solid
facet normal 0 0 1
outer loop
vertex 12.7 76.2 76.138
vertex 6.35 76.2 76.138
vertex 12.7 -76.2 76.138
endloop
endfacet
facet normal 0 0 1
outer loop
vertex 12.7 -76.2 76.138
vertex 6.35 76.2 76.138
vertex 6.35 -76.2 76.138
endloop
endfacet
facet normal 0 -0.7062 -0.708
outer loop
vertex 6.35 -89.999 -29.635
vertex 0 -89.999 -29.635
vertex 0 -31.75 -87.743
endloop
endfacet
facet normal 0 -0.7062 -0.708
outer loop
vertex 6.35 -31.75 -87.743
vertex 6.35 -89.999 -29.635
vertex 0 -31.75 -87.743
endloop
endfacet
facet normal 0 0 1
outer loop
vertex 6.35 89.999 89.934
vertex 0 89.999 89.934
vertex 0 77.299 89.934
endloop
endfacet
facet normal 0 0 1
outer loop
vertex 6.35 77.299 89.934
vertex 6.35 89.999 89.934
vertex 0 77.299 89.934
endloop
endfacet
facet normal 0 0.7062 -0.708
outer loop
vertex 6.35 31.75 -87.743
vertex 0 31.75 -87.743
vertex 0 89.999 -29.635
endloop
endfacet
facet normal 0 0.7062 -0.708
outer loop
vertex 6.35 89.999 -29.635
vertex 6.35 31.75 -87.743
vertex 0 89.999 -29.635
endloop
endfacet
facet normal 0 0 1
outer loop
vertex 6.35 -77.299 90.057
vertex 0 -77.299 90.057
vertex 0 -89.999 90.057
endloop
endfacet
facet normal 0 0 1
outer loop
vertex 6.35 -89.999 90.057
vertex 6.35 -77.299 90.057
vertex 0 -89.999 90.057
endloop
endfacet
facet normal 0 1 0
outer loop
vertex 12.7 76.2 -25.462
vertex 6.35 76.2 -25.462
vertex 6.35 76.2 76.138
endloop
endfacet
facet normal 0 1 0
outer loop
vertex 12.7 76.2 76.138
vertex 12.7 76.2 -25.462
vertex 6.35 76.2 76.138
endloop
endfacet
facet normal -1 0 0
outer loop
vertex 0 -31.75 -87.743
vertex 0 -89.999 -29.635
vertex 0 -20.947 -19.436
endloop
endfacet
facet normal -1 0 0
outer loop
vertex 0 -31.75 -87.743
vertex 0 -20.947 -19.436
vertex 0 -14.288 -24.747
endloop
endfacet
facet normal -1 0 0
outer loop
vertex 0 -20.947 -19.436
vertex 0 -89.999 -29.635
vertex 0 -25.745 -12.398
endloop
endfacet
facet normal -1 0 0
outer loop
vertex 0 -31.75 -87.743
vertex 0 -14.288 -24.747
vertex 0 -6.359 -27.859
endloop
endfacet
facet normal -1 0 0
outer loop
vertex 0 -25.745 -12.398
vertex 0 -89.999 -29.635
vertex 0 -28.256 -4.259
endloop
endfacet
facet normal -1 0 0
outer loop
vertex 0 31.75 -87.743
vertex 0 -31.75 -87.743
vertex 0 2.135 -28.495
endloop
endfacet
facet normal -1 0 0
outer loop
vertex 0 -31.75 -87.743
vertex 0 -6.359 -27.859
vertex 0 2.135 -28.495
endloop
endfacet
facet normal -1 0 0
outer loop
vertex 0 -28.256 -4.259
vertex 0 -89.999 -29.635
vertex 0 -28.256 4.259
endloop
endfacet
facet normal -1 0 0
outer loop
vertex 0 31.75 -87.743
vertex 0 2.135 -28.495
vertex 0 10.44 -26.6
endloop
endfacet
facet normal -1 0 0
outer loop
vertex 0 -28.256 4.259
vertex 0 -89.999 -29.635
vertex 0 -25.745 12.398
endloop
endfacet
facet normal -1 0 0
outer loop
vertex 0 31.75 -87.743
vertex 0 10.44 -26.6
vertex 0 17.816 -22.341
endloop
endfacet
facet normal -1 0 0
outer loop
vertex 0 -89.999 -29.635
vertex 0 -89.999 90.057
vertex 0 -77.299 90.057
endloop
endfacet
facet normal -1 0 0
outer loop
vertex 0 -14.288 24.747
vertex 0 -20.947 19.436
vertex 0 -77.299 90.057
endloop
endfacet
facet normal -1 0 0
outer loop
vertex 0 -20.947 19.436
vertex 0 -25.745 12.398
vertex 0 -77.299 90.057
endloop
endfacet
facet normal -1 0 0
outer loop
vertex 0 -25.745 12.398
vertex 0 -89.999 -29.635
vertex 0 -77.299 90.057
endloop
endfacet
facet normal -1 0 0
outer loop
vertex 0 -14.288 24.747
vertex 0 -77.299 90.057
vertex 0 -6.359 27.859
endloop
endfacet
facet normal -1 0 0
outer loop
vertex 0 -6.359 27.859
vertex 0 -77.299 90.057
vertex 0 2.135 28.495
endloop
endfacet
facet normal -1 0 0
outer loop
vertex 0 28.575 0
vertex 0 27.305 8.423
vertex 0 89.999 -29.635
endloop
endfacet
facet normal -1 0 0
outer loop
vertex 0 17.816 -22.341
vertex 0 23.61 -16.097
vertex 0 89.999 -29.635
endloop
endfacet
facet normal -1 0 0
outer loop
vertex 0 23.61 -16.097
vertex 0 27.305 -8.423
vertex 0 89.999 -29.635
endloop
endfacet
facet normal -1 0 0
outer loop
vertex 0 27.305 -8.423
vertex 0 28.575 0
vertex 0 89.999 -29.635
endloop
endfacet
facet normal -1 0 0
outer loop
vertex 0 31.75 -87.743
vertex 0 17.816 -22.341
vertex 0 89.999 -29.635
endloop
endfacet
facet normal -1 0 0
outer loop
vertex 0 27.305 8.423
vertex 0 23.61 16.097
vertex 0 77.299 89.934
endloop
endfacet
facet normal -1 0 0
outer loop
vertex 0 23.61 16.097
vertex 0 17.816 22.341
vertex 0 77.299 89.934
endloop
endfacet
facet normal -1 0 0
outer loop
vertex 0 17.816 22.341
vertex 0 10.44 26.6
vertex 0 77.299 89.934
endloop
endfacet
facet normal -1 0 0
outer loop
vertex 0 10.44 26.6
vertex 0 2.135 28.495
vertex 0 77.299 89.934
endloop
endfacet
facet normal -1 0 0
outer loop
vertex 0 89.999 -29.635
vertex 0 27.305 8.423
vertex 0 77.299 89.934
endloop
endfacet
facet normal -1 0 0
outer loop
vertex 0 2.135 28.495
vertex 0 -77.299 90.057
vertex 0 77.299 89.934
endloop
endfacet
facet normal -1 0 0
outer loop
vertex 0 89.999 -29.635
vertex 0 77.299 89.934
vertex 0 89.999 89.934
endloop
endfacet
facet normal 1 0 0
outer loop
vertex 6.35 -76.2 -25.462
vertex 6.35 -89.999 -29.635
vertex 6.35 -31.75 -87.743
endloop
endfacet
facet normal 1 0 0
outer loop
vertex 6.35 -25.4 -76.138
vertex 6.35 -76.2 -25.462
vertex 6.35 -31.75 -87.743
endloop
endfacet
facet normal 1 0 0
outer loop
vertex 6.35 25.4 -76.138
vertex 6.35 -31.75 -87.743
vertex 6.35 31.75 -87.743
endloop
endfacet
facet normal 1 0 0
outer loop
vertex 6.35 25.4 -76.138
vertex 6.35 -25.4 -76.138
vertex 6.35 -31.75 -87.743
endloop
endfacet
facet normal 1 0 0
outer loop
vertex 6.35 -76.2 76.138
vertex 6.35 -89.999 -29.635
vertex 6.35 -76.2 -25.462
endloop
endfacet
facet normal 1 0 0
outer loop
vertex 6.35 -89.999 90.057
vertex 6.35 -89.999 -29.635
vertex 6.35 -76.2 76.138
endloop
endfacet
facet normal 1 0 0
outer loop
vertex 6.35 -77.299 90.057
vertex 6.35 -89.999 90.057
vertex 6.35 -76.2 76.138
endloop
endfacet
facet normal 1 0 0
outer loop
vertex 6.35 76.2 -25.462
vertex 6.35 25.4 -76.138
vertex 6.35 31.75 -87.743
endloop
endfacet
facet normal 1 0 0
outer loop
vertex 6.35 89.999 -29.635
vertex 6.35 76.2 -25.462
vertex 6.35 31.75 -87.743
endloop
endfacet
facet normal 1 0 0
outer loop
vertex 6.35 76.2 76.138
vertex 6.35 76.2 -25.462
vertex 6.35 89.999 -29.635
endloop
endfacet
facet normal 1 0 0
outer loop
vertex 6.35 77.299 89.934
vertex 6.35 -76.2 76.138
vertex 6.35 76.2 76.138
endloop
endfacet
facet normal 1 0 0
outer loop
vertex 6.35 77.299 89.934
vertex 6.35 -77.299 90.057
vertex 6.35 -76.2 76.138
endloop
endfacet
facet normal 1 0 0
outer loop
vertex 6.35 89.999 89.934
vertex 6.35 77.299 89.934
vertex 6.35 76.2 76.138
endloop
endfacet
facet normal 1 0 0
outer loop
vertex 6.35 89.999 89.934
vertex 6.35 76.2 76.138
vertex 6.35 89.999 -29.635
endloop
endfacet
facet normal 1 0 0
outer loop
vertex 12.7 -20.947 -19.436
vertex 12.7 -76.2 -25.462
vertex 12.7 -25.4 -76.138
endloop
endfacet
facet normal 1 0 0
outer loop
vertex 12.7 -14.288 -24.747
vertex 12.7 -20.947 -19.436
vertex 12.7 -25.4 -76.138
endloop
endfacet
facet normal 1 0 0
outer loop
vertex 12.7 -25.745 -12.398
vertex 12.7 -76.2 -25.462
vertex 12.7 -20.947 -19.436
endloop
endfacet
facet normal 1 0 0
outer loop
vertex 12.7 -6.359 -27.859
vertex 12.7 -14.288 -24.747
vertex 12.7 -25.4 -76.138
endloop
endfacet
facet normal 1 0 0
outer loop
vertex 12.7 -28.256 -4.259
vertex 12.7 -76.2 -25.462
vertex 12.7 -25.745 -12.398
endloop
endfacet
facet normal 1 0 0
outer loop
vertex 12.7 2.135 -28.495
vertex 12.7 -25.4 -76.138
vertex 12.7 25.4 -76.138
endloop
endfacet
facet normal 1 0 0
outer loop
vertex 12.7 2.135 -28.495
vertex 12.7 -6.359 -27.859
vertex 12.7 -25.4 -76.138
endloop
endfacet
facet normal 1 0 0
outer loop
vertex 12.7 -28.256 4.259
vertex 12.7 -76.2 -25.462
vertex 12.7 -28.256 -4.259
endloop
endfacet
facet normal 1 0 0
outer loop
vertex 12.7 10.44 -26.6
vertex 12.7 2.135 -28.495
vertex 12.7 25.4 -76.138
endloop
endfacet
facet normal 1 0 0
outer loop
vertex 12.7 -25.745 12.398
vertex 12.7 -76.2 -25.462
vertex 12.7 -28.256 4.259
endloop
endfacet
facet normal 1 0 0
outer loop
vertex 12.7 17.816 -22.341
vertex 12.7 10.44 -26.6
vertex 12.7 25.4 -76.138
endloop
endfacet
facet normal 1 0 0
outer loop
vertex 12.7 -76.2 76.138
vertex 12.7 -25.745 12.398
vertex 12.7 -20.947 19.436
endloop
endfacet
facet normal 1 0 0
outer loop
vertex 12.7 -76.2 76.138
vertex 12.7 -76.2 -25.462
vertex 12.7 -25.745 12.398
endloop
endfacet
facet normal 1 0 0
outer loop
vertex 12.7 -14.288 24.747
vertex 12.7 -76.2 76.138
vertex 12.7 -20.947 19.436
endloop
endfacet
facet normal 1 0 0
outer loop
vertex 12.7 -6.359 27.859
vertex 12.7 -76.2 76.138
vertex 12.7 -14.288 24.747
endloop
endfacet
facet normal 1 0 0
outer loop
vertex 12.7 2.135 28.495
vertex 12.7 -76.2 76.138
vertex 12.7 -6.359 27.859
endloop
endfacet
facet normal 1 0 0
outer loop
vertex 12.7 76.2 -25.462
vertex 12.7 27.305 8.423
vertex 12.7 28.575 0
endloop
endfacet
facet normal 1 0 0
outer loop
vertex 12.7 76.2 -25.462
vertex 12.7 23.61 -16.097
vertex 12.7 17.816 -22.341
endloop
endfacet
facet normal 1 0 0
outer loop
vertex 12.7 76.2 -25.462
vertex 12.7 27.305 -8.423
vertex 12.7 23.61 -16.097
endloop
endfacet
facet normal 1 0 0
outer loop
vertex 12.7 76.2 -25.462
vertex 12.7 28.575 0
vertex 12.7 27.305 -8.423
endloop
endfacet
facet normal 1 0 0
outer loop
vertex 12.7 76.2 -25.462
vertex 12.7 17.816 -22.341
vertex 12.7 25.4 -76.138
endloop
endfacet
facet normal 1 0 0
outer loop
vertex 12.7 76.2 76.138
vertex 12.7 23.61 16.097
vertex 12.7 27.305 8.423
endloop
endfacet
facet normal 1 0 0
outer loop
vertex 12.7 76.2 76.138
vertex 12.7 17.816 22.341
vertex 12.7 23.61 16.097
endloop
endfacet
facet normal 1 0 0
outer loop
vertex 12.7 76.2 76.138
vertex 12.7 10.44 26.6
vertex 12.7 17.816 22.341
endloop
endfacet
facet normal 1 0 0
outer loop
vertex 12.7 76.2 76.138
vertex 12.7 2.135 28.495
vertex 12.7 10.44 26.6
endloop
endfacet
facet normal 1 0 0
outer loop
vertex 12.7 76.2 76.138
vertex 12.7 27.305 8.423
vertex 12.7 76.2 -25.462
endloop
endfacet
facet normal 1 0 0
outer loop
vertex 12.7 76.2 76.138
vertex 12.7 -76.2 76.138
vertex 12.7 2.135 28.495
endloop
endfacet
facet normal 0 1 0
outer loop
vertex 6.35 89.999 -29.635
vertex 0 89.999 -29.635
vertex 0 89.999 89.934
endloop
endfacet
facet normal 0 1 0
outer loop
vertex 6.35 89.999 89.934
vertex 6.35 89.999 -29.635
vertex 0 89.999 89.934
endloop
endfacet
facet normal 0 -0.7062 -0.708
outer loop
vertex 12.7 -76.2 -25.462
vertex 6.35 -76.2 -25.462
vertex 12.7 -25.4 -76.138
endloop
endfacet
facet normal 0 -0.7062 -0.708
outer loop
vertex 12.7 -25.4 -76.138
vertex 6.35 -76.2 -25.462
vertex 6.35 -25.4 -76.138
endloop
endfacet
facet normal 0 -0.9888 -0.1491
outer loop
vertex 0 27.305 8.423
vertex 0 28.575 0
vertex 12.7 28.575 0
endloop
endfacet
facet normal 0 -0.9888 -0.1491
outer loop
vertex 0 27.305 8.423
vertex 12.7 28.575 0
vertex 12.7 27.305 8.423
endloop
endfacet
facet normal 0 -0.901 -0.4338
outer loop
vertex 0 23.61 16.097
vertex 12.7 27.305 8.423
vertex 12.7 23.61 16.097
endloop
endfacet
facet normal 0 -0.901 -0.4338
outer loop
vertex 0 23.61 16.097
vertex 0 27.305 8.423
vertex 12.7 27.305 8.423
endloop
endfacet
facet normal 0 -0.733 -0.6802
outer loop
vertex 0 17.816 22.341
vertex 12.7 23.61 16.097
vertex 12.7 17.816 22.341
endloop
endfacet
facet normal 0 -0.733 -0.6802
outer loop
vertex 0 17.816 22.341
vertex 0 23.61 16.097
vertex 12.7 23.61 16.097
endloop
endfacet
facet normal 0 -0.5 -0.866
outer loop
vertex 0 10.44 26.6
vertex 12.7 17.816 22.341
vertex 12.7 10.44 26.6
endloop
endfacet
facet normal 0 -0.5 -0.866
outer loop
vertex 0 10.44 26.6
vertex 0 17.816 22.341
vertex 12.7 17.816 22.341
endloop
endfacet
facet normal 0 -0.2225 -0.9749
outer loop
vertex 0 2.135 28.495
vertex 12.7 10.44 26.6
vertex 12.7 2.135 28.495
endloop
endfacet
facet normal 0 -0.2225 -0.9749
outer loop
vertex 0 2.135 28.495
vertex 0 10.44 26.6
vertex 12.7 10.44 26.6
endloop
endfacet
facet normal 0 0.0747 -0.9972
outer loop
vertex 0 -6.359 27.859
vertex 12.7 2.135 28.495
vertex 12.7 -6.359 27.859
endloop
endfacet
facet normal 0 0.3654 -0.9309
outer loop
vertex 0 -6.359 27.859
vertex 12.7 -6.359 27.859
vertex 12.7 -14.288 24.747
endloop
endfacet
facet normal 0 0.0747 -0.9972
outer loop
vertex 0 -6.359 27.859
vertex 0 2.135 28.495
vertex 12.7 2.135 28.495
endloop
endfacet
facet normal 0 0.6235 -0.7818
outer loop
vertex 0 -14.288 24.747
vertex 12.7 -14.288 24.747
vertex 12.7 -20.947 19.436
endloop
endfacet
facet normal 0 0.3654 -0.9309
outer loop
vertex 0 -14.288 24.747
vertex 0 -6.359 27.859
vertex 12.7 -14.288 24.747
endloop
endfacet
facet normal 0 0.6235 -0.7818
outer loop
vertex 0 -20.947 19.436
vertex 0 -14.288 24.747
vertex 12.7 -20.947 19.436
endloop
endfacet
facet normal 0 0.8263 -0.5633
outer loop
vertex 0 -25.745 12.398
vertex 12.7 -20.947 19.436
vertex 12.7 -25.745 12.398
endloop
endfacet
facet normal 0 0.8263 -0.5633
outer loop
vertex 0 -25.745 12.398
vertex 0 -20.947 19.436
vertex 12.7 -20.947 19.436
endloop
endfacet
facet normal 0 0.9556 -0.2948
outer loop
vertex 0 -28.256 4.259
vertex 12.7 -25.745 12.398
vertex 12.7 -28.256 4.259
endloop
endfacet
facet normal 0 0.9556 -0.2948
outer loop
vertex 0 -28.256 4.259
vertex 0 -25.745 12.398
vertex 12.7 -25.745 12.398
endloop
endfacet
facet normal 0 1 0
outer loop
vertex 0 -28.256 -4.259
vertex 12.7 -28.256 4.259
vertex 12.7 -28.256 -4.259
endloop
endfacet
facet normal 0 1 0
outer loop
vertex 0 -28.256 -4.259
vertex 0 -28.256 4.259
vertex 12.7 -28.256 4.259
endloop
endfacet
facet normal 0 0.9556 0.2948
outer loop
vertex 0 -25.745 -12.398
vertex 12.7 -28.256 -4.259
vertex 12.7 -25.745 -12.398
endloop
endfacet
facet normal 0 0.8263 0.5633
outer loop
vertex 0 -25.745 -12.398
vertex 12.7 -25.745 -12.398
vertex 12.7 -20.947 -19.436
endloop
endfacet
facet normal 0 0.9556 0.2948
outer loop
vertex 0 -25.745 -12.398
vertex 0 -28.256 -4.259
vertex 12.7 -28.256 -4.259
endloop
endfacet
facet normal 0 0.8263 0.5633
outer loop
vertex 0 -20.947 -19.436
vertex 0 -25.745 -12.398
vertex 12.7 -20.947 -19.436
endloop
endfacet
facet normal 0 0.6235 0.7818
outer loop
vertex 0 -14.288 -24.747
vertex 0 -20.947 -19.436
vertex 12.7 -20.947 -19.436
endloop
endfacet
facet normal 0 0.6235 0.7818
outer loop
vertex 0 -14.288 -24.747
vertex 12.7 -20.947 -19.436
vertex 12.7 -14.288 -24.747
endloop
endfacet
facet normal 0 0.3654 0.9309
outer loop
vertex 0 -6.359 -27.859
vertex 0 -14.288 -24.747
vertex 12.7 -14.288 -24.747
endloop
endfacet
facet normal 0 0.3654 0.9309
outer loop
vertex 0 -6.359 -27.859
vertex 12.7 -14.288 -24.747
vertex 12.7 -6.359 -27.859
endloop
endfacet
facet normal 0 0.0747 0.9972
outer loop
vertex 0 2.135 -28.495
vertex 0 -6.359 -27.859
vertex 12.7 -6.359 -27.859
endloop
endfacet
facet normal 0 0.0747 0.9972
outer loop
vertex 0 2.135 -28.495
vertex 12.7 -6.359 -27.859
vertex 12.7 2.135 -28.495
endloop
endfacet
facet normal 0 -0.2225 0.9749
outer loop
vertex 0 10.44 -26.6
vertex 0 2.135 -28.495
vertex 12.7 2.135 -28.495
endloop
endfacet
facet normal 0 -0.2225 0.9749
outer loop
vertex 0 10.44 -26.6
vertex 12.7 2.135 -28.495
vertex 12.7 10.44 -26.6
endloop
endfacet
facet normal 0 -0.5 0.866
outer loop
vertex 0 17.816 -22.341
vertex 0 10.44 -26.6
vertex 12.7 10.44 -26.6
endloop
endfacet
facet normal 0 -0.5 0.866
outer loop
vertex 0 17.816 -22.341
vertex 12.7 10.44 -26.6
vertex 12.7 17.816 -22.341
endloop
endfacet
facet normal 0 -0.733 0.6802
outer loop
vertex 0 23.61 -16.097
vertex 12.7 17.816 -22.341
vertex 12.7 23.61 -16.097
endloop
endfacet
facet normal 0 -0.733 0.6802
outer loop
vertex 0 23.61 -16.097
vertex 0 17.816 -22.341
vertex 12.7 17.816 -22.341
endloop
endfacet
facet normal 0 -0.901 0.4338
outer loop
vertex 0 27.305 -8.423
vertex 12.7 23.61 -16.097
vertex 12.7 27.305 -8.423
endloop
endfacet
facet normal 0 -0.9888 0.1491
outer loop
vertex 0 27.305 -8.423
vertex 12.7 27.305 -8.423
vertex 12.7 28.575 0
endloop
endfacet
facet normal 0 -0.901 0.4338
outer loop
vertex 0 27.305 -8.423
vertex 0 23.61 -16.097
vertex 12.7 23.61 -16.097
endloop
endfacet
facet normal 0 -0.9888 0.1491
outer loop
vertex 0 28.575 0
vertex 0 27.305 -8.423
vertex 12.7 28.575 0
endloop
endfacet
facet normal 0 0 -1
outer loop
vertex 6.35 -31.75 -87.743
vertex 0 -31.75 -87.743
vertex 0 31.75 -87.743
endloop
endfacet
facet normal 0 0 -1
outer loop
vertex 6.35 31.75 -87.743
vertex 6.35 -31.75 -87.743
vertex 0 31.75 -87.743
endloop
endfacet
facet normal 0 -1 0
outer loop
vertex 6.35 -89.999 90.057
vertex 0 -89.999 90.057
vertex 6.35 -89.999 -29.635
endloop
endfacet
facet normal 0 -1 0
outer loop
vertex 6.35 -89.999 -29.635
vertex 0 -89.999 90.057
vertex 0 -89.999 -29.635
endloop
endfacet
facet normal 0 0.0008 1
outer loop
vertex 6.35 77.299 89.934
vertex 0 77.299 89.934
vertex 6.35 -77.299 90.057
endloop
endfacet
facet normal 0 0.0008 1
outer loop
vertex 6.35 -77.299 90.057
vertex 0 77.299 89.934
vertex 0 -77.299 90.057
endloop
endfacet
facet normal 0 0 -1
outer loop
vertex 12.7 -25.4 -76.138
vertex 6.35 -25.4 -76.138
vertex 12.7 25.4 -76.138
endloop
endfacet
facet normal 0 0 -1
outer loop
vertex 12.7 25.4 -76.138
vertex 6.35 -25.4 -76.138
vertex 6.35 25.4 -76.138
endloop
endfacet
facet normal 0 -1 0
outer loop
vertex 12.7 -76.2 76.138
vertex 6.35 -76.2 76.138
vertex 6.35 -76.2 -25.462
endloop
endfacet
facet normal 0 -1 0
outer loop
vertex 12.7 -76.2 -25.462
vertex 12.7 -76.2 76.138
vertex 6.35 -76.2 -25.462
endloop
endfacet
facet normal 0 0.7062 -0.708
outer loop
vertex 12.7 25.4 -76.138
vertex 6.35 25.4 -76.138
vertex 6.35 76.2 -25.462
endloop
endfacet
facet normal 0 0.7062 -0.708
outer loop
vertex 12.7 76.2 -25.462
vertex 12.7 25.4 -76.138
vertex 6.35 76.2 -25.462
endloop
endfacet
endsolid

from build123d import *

# Parameters (mm, degrees)
F0_R     = 28.575
F1_DEPTH = 12.7
F2_DEPTH = 6.35


with BuildPart() as f1:
    # F0 (on Right) → F1 (new body)
    with BuildSketch(Plane.YZ):
        Polygon((-76.2, -25.46159), (-25.4, -76.13841), (25.4, -76.13841), (76.2, -25.46159), (76.2, 76.13841), (-76.2, 76.13841), align=None)
        Circle(F0_R, mode=Mode.SUBTRACT)
    extrude(amount=F1_DEPTH)

    # F0 (on Right) → F2 (join)
    with BuildSketch(Plane.YZ):
        Polygon((89.998516, 89.934262), (77.298516, 89.934262), (-77.298516, 90.057443), (-89.998516, 90.057443), (-89.998516, -29.635283), (-31.75, -87.742557), (31.75, -87.742557), (89.998516, -29.635283), (89.998516, 77.234262), align=None)
        Polygon((25.4, -76.13841), (-25.4, -76.13841), (-76.2, -25.46159), (-76.2, 76.13841), (76.2, 76.13841), (76.2, -25.46159), align=None, mode=Mode.SUBTRACT)
    extrude(amount=F2_DEPTH)


solid = f1.part
